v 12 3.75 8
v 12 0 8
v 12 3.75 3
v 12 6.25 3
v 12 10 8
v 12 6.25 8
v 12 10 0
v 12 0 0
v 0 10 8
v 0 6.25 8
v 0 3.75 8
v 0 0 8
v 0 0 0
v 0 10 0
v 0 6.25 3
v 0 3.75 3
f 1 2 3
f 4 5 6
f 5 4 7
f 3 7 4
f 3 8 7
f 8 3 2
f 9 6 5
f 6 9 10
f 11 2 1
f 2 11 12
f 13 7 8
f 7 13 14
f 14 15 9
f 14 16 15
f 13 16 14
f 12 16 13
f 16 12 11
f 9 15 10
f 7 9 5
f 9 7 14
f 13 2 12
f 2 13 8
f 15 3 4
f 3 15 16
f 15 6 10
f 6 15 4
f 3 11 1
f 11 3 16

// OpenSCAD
$fn = 32;

// ----------------------------------------------------------------------
// Micro clip: slotted block, 5-20 mm class
// ----------------------------------------------------------------------

// --- parameters (mm) ---
block_l = 12;             // block length, X
block_w = 10;             // block width, Y
block_h = 8;              // block height, Z
slot_w = 2.5;             // slot width
slot_d = 5;               // slot depth from the top

difference() {
  cube([block_l, block_w, block_h]);
  translate([-1, block_w / 2 - slot_w / 2, block_h - slot_d])
    cube([block_l + 2, slot_w, slot_d + 1]);
}
